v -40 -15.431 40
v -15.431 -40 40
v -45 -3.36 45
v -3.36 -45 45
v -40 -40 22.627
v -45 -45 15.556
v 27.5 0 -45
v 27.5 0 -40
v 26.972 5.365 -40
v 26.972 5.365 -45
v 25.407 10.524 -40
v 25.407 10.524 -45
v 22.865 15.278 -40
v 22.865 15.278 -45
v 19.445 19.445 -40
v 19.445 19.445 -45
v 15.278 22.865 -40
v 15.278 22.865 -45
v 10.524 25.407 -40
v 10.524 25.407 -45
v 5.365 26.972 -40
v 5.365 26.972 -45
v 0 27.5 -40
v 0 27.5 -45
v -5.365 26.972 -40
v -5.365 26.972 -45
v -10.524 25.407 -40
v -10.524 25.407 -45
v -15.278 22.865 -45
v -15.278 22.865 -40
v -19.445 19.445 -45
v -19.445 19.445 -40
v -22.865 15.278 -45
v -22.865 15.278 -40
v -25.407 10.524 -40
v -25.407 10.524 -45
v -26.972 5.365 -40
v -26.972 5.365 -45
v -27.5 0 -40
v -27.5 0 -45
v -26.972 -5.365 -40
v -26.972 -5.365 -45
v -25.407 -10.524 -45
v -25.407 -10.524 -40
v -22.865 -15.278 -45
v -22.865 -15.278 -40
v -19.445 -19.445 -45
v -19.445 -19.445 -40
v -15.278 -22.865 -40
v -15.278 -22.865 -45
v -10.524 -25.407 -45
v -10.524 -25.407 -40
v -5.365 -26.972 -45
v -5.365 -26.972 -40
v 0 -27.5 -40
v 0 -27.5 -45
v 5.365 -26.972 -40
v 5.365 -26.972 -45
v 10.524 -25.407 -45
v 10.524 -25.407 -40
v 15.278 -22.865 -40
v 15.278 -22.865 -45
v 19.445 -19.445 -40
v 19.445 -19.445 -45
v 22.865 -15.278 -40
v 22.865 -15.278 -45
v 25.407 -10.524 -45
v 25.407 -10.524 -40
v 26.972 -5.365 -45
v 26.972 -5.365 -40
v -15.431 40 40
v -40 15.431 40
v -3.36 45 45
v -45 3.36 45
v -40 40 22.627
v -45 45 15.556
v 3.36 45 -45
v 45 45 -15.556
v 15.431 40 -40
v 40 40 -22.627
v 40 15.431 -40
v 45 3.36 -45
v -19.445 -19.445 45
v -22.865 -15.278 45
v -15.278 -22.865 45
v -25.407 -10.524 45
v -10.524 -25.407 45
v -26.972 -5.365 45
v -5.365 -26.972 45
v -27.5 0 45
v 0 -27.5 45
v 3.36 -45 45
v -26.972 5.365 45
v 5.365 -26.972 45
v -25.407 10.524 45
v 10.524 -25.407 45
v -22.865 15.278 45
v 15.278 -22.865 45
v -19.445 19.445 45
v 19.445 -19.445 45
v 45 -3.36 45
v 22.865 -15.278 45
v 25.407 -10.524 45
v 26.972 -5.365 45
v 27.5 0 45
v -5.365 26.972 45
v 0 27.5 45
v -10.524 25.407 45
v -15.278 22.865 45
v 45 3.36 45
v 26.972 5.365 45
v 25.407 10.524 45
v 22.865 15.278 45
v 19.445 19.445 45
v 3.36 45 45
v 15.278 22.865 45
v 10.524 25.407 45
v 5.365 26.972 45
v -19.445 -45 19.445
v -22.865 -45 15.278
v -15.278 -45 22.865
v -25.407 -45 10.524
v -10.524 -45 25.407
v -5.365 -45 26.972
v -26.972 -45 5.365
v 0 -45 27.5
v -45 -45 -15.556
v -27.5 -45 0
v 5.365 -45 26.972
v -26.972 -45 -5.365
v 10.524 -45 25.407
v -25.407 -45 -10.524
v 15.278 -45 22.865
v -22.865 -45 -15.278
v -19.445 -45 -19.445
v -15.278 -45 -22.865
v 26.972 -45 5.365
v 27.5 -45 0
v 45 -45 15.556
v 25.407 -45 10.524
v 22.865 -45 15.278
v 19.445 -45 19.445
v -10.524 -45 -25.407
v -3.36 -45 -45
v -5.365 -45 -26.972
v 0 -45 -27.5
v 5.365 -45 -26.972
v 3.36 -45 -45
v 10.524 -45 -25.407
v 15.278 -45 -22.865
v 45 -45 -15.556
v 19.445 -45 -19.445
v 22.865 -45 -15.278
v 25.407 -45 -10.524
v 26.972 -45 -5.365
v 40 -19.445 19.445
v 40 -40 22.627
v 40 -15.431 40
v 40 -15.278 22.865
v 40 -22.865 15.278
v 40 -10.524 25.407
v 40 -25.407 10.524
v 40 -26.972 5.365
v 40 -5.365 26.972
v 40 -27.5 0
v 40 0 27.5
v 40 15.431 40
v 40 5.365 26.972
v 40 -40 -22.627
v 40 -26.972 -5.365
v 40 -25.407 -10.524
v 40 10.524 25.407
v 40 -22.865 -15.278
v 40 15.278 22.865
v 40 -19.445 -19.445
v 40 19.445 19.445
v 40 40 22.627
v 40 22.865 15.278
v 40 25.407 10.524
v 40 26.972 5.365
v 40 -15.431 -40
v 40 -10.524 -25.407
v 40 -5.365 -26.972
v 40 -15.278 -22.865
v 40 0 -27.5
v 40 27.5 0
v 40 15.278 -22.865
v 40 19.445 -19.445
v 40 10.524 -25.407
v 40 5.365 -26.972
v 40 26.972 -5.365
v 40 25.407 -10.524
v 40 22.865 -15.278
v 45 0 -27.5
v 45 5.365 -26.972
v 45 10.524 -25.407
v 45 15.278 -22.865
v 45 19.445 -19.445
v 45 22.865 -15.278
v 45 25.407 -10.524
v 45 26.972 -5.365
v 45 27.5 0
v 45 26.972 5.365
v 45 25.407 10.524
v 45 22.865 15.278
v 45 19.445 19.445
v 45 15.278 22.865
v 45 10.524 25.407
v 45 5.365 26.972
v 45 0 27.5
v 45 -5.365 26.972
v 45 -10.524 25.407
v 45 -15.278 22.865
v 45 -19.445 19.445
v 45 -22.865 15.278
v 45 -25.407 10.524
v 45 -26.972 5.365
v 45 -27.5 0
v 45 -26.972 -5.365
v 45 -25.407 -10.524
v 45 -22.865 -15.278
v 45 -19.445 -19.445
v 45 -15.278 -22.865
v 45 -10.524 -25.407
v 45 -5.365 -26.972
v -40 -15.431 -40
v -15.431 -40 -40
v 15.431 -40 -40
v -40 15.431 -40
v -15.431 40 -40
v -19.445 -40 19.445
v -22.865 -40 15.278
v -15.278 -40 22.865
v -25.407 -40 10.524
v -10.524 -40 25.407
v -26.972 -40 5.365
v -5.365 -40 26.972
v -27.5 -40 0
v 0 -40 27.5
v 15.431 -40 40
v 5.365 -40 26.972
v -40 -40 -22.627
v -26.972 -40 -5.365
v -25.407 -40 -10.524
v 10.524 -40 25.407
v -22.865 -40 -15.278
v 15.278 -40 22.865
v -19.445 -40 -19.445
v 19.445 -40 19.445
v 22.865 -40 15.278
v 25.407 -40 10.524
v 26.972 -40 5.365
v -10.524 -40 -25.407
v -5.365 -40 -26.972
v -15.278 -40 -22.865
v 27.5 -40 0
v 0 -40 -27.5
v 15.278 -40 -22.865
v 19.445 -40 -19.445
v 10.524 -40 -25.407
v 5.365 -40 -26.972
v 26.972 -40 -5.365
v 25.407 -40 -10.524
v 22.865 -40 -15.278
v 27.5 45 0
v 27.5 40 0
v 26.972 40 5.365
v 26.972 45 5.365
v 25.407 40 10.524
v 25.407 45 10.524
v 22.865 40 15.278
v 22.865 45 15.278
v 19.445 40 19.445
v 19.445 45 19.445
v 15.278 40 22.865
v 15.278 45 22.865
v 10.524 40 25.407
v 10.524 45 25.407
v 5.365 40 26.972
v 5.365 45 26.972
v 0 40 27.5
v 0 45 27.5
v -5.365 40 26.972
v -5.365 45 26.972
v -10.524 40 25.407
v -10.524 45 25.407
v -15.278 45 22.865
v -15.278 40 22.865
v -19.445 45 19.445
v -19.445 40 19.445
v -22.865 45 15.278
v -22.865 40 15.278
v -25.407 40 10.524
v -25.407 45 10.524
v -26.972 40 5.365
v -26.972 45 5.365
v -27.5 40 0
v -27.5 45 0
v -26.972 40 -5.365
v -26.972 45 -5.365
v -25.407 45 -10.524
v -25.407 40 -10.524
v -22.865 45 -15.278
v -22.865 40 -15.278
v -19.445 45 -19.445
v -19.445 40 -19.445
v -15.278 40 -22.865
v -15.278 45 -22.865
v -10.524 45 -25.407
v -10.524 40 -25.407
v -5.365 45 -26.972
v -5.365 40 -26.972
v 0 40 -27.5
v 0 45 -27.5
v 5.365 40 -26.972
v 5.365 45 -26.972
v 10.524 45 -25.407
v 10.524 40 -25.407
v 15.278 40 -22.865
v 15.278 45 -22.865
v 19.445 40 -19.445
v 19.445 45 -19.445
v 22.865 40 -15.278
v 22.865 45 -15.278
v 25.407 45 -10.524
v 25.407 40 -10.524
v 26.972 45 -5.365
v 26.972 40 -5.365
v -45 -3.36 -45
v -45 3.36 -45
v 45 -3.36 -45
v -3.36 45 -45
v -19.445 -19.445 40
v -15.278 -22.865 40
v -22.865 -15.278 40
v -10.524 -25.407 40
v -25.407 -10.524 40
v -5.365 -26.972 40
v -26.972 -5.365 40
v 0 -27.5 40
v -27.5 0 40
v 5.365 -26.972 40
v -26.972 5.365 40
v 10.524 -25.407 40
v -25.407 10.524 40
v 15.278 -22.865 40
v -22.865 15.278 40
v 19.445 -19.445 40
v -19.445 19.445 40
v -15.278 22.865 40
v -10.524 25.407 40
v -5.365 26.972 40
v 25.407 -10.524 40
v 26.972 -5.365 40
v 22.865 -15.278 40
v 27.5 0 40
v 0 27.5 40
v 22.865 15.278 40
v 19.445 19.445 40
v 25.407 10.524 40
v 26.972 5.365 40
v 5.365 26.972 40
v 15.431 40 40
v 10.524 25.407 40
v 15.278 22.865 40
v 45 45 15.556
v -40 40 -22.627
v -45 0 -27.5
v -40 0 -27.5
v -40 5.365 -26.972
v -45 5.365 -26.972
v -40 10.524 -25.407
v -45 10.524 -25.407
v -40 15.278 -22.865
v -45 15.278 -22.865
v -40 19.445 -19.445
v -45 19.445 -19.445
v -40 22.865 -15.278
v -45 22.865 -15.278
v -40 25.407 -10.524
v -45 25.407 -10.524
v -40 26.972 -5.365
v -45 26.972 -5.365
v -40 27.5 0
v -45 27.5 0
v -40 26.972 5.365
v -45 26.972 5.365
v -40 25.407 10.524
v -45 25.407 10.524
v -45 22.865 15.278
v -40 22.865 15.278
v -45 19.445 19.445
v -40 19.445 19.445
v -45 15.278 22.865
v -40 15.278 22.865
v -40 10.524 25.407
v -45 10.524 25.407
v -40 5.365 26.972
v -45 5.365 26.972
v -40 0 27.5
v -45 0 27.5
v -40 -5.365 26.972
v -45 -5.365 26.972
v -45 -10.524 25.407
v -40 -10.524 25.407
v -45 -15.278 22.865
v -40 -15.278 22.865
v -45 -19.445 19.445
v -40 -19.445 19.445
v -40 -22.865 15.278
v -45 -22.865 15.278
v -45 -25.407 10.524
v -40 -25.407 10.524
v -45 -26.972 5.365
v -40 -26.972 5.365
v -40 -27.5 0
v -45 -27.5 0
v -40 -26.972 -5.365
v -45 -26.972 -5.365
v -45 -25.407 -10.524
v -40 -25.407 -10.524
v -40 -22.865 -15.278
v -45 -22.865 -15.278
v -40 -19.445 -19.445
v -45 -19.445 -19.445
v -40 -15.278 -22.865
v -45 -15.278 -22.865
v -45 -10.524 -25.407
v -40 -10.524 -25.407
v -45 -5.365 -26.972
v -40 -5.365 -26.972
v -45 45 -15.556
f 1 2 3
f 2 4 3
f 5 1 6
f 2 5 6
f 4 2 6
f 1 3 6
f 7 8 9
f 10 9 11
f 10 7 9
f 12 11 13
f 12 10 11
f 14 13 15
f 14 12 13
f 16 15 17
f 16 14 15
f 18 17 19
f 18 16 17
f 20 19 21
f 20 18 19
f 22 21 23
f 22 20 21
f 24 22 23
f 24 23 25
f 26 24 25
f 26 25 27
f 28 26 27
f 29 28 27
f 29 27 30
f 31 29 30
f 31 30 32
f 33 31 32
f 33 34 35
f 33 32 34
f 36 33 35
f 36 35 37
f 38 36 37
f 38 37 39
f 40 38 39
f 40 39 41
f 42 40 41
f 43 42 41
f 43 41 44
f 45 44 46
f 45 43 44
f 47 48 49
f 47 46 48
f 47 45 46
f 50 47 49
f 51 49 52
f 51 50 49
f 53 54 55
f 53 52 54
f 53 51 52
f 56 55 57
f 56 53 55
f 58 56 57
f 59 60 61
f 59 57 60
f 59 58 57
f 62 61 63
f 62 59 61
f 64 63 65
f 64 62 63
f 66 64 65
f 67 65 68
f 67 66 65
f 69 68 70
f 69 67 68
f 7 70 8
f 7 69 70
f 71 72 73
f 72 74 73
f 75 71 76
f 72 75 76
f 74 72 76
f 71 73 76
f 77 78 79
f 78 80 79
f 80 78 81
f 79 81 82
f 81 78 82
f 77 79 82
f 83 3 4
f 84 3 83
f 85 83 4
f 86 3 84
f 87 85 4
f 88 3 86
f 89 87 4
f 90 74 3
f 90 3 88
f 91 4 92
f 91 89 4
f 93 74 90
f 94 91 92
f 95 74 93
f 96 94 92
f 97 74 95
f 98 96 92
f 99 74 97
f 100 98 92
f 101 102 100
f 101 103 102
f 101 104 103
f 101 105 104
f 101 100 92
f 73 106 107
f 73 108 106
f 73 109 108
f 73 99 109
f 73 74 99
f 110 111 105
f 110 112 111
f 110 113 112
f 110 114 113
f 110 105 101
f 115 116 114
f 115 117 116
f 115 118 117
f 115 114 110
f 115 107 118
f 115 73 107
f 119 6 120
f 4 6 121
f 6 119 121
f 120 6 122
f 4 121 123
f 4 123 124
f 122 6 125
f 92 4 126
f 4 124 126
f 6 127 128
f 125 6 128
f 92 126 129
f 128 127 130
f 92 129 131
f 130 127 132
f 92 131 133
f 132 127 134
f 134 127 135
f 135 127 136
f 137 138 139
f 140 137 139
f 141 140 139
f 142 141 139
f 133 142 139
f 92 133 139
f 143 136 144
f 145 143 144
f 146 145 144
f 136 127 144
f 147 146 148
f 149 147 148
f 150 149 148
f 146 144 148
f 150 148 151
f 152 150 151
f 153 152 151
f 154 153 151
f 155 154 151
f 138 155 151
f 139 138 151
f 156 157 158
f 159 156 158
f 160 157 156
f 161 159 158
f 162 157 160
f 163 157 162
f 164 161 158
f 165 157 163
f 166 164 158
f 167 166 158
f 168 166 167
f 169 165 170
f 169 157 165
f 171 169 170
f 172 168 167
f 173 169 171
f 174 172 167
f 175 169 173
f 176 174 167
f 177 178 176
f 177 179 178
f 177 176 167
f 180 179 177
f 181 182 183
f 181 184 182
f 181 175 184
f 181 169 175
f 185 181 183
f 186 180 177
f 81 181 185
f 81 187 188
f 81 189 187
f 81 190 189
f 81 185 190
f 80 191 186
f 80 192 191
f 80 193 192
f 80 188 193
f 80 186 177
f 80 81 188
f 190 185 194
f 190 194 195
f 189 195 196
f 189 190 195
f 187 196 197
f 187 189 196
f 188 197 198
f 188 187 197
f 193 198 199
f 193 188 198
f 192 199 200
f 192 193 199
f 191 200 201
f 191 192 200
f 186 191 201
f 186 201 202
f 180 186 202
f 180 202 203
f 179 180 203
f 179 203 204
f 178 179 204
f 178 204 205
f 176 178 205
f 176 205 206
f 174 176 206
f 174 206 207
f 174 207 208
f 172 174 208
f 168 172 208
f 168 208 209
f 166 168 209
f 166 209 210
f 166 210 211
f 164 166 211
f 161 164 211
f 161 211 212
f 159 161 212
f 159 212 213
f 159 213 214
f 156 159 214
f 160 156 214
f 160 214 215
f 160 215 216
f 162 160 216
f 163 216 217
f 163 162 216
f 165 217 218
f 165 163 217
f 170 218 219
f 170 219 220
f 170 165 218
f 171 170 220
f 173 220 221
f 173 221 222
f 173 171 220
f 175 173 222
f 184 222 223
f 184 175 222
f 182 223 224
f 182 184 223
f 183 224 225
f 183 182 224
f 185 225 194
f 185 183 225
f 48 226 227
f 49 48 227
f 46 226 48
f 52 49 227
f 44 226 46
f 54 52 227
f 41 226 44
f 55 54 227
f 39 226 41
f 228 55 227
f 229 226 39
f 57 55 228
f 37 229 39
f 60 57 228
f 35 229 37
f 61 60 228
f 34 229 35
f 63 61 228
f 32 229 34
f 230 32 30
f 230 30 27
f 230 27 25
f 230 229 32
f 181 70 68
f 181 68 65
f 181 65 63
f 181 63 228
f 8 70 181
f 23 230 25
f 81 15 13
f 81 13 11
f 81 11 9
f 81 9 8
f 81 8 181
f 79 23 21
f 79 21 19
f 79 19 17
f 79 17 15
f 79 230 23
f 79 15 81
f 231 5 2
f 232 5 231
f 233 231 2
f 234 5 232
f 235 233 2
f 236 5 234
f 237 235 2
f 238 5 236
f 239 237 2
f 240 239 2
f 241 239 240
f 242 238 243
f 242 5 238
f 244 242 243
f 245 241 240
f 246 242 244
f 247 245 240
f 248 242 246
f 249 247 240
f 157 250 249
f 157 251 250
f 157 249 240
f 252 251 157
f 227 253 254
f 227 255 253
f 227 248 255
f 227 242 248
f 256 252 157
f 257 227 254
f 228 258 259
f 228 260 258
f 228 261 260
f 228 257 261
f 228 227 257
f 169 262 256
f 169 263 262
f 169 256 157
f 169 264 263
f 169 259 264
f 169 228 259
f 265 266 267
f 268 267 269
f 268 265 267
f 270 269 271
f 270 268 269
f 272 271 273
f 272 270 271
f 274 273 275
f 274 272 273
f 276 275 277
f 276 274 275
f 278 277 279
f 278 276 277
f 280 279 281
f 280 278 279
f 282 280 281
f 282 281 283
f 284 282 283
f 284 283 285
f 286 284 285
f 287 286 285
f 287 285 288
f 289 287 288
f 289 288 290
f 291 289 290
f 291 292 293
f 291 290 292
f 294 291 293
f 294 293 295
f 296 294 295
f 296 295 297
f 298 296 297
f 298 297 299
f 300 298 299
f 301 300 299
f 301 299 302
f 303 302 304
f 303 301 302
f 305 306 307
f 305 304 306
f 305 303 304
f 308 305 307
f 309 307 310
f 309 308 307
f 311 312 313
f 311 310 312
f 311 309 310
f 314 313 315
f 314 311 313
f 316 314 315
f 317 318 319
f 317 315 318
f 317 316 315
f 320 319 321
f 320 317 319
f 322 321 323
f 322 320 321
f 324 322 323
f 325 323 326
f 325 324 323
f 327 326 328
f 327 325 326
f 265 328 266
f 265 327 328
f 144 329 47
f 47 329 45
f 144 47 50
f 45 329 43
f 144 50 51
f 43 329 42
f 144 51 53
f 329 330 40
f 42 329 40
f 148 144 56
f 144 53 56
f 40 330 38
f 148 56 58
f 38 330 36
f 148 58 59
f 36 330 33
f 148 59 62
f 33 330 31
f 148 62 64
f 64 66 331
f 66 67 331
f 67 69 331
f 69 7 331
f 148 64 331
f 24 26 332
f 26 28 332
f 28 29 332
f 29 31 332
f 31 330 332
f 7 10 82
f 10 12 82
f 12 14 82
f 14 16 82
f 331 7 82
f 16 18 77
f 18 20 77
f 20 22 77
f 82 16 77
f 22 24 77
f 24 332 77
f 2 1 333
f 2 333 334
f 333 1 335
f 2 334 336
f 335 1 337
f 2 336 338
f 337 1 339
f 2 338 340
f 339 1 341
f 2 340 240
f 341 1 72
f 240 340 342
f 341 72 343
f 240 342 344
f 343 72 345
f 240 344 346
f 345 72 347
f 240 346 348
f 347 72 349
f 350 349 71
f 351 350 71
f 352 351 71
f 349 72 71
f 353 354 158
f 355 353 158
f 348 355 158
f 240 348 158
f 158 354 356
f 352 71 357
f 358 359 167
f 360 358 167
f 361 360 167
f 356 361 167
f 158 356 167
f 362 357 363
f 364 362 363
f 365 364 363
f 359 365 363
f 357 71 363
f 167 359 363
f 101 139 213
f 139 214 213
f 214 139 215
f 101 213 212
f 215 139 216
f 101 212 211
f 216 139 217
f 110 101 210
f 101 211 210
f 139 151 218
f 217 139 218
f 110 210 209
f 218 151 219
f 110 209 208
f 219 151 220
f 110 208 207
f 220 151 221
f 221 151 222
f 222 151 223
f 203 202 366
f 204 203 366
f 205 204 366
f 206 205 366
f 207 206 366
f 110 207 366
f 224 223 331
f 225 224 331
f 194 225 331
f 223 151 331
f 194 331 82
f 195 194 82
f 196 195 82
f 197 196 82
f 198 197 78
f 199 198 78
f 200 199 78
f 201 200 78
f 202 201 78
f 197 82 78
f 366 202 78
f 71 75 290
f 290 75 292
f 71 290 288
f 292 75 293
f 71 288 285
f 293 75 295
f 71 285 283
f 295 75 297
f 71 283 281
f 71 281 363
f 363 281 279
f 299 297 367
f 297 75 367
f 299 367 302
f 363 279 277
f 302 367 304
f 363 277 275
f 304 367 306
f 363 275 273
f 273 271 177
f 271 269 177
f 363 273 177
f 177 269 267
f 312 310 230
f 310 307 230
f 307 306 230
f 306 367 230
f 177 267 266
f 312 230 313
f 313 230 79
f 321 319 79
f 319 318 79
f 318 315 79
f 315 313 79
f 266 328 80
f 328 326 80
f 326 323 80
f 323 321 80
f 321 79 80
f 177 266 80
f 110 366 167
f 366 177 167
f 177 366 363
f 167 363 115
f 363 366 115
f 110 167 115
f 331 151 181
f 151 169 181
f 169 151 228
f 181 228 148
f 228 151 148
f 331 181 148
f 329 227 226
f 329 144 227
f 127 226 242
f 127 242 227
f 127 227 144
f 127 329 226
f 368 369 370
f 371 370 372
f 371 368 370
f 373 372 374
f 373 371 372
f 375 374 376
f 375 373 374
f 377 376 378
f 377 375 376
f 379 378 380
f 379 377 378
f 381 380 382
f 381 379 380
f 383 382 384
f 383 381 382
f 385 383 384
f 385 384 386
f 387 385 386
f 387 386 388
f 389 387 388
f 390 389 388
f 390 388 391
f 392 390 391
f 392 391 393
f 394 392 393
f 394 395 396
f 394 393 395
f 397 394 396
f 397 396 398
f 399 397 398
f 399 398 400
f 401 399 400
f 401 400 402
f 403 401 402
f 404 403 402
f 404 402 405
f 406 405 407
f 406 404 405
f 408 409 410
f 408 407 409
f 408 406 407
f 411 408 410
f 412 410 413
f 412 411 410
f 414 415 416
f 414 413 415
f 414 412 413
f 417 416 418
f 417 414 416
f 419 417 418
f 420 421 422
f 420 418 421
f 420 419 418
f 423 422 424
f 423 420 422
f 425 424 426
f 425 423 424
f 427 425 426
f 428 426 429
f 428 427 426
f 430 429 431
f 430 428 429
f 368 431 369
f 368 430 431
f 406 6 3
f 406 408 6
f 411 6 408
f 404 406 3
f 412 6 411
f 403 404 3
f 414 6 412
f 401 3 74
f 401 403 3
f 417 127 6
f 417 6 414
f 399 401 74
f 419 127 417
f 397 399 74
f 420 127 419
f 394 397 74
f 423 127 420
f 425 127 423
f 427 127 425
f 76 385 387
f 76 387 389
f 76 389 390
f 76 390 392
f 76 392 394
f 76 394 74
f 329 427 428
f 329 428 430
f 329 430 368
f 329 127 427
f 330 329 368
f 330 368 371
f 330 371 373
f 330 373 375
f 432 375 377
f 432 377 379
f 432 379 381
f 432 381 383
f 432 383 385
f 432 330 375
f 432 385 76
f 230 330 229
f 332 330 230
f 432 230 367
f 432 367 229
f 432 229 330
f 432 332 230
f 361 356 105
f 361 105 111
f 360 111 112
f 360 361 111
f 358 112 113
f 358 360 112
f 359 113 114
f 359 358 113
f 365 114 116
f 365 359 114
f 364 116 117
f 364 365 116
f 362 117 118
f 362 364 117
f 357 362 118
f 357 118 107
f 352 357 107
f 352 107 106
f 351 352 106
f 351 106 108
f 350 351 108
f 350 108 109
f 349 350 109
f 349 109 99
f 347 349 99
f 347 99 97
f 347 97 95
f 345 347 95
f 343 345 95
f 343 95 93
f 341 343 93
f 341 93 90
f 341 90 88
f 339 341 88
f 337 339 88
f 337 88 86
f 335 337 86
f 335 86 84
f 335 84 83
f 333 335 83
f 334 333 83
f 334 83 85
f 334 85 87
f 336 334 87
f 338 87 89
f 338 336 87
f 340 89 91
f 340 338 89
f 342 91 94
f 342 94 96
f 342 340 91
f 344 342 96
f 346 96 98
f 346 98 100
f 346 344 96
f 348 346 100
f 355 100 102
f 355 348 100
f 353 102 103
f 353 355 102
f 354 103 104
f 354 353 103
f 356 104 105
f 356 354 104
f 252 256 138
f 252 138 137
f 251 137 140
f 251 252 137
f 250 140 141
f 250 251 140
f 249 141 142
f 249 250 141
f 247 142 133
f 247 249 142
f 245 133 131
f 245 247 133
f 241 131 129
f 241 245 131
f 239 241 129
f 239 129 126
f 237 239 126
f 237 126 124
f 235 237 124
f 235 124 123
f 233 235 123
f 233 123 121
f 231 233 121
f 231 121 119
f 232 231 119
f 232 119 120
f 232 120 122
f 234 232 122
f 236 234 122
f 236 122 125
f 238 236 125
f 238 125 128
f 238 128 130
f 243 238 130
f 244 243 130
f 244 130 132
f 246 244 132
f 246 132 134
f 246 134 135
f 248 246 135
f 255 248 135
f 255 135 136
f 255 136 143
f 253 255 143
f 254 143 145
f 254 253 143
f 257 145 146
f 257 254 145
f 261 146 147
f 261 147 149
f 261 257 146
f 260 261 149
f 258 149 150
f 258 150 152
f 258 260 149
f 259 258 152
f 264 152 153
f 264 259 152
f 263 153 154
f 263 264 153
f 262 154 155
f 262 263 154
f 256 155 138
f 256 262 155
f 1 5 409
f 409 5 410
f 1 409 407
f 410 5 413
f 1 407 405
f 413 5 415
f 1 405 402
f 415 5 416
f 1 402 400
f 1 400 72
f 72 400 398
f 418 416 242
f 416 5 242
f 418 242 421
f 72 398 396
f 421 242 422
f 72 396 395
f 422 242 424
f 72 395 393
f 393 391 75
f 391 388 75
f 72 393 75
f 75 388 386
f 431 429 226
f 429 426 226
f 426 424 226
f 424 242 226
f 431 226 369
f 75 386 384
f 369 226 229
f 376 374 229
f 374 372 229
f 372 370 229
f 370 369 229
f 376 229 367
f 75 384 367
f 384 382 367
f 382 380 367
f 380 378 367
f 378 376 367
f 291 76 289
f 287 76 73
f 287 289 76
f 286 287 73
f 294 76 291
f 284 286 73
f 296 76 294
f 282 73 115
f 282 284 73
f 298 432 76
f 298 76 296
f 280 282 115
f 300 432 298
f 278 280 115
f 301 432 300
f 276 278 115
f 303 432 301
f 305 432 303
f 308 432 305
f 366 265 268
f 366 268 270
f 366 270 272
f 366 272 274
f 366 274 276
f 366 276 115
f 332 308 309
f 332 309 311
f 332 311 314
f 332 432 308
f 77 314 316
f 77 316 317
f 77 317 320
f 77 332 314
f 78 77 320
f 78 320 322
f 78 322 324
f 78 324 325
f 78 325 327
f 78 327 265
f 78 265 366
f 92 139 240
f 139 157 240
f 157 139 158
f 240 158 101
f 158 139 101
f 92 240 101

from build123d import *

# Parameters (mm, degrees)
PAD001_DEPTH            = 35
PAD_DEPTH               = 35
CYLINDER002_R           = 27.5
CYLINDER002_DEPTH       = 90
CYLINDER002_PITCH_ANGLE = 90
CYLINDER001_R           = 27.5
CYLINDER001_DEPTH       = 90
CYLINDER001_ROLL_ANGLE  = 90
CYLINDER_R              = 27.5
CYLINDER_DEPTH          = 90
BOX001_W                = 80
BOX001_H                = 80
BOX001_DEPTH            = 80
BOX_W                   = 90
BOX_H                   = 90
BOX_DEPTH               = 90


with BuildPart() as pad001:
    # Sketch001 → Pad001 (new body, symmetric)
    with BuildSketch(Plane(origin=(0, 0, 0), x_dir=(0.707107, -0.707107, 0), z_dir=(-0.707107, -0.707107, 0))):
        Polygon((-65, 14.195959), (-65, 50), (-29.195959, 50), align=None)
        Polygon((29.195959, 50), (65, 50), (65, 14.195959), align=None)
        Polygon((-65, -14.195959), (-65, -50), (-29.195959, -50), align=None)
        Polygon((29.195959, -50), (65, -50), (65, -14.195959), align=None)
    extrude(amount=PAD001_DEPTH, both=True)


with BuildPart() as pad:
    # Sketch → Pad (new body, symmetric)
    with BuildSketch(Plane(origin=(0, 0, 0), x_dir=(0.707107, 0.707107, 0), z_dir=(0.707107, -0.707107, 0))):
        Polygon((-65, 14.195959), (-65, 50), (-29.195959, 50), align=None)
        Polygon((29.195959, 50), (65, 50), (65, 14.195959), align=None)
        Polygon((-65, -14.195959), (-65, -50), (-29.195959, -50), align=None)
        Polygon((29.195959, -50), (65, -50), (65, -14.195959), align=None)
    extrude(amount=PAD_DEPTH, both=True)


with BuildPart() as cylinder002:
    # Cylinder002 → Cylinder002 (new body)
    with BuildSketch(Plane.XY):
        Circle(CYLINDER002_R)
    extrude(amount=CYLINDER002_DEPTH)


with BuildPart() as cylinder002_1:
    # Cylinder002 pitch: moved
    add(cylinder002.part.rotate(Axis((0, 0, 0), (0, 1, 0)), CYLINDER002_PITCH_ANGLE))


with BuildPart() as cylinder002_2:
    # Cylinder002 placement: moved
    add(cylinder002_1.part.moved(Location((-45, 0, 0))))


with BuildPart() as cylinder001:
    # Cylinder001 → Cylinder001 (new body)
    with BuildSketch(Plane.XY):
        Circle(CYLINDER001_R)
    extrude(amount=CYLINDER001_DEPTH)


with BuildPart() as cylinder001_1:
    # Cylinder001 roll: moved
    add(cylinder001.part.rotate(Axis((0, 0, 0), (1, 0, 0)), CYLINDER001_ROLL_ANGLE))


with BuildPart() as cylinder001_2:
    # Cylinder001 placement: moved
    add(cylinder001_1.part.moved(Location((0, 45, 0))))


with BuildPart() as cylinder:
    # Cylinder → Cylinder (new body)
    with BuildSketch(Plane.XY.offset(-45)):
        Circle(CYLINDER_R)
    extrude(amount=CYLINDER_DEPTH)


with BuildPart() as cubo_interno:
    # Box001 → Box001 (new body)
    with BuildSketch(Plane(origin=(-40, -40, -40), x_dir=(1, 0, 0), z_dir=(0, 0, 1))):
        with Locations((40, 40)):
            Rectangle(BOX001_W, BOX001_H)
    extrude(amount=BOX001_DEPTH)


with BuildPart() as cut005:
    # Box → Box (new body)
    with BuildSketch(Plane(origin=(-45, -45, -45), x_dir=(1, 0, 0), z_dir=(0, 0, 1))):
        with Locations((45, 45)):
            Rectangle(BOX_W, BOX_H)
    extrude(amount=BOX_DEPTH)

    # Cut: cut Cubo Interno
    add(cubo_interno.part, mode=Mode.SUBTRACT)

    # Cut001: cut Cylinder
    add(cylinder.part, mode=Mode.SUBTRACT)

    # Cut002: cut Cylinder001
    add(cylinder001_2.part, mode=Mode.SUBTRACT)

    # Cut003: cut Cylinder002
    add(cylinder002_2.part, mode=Mode.SUBTRACT)

    # Cut004: cut Pad
    add(pad.part, mode=Mode.SUBTRACT)

    # Cut005: cut Pad001
    add(pad001.part, mode=Mode.SUBTRACT)


solid = cut005.part
